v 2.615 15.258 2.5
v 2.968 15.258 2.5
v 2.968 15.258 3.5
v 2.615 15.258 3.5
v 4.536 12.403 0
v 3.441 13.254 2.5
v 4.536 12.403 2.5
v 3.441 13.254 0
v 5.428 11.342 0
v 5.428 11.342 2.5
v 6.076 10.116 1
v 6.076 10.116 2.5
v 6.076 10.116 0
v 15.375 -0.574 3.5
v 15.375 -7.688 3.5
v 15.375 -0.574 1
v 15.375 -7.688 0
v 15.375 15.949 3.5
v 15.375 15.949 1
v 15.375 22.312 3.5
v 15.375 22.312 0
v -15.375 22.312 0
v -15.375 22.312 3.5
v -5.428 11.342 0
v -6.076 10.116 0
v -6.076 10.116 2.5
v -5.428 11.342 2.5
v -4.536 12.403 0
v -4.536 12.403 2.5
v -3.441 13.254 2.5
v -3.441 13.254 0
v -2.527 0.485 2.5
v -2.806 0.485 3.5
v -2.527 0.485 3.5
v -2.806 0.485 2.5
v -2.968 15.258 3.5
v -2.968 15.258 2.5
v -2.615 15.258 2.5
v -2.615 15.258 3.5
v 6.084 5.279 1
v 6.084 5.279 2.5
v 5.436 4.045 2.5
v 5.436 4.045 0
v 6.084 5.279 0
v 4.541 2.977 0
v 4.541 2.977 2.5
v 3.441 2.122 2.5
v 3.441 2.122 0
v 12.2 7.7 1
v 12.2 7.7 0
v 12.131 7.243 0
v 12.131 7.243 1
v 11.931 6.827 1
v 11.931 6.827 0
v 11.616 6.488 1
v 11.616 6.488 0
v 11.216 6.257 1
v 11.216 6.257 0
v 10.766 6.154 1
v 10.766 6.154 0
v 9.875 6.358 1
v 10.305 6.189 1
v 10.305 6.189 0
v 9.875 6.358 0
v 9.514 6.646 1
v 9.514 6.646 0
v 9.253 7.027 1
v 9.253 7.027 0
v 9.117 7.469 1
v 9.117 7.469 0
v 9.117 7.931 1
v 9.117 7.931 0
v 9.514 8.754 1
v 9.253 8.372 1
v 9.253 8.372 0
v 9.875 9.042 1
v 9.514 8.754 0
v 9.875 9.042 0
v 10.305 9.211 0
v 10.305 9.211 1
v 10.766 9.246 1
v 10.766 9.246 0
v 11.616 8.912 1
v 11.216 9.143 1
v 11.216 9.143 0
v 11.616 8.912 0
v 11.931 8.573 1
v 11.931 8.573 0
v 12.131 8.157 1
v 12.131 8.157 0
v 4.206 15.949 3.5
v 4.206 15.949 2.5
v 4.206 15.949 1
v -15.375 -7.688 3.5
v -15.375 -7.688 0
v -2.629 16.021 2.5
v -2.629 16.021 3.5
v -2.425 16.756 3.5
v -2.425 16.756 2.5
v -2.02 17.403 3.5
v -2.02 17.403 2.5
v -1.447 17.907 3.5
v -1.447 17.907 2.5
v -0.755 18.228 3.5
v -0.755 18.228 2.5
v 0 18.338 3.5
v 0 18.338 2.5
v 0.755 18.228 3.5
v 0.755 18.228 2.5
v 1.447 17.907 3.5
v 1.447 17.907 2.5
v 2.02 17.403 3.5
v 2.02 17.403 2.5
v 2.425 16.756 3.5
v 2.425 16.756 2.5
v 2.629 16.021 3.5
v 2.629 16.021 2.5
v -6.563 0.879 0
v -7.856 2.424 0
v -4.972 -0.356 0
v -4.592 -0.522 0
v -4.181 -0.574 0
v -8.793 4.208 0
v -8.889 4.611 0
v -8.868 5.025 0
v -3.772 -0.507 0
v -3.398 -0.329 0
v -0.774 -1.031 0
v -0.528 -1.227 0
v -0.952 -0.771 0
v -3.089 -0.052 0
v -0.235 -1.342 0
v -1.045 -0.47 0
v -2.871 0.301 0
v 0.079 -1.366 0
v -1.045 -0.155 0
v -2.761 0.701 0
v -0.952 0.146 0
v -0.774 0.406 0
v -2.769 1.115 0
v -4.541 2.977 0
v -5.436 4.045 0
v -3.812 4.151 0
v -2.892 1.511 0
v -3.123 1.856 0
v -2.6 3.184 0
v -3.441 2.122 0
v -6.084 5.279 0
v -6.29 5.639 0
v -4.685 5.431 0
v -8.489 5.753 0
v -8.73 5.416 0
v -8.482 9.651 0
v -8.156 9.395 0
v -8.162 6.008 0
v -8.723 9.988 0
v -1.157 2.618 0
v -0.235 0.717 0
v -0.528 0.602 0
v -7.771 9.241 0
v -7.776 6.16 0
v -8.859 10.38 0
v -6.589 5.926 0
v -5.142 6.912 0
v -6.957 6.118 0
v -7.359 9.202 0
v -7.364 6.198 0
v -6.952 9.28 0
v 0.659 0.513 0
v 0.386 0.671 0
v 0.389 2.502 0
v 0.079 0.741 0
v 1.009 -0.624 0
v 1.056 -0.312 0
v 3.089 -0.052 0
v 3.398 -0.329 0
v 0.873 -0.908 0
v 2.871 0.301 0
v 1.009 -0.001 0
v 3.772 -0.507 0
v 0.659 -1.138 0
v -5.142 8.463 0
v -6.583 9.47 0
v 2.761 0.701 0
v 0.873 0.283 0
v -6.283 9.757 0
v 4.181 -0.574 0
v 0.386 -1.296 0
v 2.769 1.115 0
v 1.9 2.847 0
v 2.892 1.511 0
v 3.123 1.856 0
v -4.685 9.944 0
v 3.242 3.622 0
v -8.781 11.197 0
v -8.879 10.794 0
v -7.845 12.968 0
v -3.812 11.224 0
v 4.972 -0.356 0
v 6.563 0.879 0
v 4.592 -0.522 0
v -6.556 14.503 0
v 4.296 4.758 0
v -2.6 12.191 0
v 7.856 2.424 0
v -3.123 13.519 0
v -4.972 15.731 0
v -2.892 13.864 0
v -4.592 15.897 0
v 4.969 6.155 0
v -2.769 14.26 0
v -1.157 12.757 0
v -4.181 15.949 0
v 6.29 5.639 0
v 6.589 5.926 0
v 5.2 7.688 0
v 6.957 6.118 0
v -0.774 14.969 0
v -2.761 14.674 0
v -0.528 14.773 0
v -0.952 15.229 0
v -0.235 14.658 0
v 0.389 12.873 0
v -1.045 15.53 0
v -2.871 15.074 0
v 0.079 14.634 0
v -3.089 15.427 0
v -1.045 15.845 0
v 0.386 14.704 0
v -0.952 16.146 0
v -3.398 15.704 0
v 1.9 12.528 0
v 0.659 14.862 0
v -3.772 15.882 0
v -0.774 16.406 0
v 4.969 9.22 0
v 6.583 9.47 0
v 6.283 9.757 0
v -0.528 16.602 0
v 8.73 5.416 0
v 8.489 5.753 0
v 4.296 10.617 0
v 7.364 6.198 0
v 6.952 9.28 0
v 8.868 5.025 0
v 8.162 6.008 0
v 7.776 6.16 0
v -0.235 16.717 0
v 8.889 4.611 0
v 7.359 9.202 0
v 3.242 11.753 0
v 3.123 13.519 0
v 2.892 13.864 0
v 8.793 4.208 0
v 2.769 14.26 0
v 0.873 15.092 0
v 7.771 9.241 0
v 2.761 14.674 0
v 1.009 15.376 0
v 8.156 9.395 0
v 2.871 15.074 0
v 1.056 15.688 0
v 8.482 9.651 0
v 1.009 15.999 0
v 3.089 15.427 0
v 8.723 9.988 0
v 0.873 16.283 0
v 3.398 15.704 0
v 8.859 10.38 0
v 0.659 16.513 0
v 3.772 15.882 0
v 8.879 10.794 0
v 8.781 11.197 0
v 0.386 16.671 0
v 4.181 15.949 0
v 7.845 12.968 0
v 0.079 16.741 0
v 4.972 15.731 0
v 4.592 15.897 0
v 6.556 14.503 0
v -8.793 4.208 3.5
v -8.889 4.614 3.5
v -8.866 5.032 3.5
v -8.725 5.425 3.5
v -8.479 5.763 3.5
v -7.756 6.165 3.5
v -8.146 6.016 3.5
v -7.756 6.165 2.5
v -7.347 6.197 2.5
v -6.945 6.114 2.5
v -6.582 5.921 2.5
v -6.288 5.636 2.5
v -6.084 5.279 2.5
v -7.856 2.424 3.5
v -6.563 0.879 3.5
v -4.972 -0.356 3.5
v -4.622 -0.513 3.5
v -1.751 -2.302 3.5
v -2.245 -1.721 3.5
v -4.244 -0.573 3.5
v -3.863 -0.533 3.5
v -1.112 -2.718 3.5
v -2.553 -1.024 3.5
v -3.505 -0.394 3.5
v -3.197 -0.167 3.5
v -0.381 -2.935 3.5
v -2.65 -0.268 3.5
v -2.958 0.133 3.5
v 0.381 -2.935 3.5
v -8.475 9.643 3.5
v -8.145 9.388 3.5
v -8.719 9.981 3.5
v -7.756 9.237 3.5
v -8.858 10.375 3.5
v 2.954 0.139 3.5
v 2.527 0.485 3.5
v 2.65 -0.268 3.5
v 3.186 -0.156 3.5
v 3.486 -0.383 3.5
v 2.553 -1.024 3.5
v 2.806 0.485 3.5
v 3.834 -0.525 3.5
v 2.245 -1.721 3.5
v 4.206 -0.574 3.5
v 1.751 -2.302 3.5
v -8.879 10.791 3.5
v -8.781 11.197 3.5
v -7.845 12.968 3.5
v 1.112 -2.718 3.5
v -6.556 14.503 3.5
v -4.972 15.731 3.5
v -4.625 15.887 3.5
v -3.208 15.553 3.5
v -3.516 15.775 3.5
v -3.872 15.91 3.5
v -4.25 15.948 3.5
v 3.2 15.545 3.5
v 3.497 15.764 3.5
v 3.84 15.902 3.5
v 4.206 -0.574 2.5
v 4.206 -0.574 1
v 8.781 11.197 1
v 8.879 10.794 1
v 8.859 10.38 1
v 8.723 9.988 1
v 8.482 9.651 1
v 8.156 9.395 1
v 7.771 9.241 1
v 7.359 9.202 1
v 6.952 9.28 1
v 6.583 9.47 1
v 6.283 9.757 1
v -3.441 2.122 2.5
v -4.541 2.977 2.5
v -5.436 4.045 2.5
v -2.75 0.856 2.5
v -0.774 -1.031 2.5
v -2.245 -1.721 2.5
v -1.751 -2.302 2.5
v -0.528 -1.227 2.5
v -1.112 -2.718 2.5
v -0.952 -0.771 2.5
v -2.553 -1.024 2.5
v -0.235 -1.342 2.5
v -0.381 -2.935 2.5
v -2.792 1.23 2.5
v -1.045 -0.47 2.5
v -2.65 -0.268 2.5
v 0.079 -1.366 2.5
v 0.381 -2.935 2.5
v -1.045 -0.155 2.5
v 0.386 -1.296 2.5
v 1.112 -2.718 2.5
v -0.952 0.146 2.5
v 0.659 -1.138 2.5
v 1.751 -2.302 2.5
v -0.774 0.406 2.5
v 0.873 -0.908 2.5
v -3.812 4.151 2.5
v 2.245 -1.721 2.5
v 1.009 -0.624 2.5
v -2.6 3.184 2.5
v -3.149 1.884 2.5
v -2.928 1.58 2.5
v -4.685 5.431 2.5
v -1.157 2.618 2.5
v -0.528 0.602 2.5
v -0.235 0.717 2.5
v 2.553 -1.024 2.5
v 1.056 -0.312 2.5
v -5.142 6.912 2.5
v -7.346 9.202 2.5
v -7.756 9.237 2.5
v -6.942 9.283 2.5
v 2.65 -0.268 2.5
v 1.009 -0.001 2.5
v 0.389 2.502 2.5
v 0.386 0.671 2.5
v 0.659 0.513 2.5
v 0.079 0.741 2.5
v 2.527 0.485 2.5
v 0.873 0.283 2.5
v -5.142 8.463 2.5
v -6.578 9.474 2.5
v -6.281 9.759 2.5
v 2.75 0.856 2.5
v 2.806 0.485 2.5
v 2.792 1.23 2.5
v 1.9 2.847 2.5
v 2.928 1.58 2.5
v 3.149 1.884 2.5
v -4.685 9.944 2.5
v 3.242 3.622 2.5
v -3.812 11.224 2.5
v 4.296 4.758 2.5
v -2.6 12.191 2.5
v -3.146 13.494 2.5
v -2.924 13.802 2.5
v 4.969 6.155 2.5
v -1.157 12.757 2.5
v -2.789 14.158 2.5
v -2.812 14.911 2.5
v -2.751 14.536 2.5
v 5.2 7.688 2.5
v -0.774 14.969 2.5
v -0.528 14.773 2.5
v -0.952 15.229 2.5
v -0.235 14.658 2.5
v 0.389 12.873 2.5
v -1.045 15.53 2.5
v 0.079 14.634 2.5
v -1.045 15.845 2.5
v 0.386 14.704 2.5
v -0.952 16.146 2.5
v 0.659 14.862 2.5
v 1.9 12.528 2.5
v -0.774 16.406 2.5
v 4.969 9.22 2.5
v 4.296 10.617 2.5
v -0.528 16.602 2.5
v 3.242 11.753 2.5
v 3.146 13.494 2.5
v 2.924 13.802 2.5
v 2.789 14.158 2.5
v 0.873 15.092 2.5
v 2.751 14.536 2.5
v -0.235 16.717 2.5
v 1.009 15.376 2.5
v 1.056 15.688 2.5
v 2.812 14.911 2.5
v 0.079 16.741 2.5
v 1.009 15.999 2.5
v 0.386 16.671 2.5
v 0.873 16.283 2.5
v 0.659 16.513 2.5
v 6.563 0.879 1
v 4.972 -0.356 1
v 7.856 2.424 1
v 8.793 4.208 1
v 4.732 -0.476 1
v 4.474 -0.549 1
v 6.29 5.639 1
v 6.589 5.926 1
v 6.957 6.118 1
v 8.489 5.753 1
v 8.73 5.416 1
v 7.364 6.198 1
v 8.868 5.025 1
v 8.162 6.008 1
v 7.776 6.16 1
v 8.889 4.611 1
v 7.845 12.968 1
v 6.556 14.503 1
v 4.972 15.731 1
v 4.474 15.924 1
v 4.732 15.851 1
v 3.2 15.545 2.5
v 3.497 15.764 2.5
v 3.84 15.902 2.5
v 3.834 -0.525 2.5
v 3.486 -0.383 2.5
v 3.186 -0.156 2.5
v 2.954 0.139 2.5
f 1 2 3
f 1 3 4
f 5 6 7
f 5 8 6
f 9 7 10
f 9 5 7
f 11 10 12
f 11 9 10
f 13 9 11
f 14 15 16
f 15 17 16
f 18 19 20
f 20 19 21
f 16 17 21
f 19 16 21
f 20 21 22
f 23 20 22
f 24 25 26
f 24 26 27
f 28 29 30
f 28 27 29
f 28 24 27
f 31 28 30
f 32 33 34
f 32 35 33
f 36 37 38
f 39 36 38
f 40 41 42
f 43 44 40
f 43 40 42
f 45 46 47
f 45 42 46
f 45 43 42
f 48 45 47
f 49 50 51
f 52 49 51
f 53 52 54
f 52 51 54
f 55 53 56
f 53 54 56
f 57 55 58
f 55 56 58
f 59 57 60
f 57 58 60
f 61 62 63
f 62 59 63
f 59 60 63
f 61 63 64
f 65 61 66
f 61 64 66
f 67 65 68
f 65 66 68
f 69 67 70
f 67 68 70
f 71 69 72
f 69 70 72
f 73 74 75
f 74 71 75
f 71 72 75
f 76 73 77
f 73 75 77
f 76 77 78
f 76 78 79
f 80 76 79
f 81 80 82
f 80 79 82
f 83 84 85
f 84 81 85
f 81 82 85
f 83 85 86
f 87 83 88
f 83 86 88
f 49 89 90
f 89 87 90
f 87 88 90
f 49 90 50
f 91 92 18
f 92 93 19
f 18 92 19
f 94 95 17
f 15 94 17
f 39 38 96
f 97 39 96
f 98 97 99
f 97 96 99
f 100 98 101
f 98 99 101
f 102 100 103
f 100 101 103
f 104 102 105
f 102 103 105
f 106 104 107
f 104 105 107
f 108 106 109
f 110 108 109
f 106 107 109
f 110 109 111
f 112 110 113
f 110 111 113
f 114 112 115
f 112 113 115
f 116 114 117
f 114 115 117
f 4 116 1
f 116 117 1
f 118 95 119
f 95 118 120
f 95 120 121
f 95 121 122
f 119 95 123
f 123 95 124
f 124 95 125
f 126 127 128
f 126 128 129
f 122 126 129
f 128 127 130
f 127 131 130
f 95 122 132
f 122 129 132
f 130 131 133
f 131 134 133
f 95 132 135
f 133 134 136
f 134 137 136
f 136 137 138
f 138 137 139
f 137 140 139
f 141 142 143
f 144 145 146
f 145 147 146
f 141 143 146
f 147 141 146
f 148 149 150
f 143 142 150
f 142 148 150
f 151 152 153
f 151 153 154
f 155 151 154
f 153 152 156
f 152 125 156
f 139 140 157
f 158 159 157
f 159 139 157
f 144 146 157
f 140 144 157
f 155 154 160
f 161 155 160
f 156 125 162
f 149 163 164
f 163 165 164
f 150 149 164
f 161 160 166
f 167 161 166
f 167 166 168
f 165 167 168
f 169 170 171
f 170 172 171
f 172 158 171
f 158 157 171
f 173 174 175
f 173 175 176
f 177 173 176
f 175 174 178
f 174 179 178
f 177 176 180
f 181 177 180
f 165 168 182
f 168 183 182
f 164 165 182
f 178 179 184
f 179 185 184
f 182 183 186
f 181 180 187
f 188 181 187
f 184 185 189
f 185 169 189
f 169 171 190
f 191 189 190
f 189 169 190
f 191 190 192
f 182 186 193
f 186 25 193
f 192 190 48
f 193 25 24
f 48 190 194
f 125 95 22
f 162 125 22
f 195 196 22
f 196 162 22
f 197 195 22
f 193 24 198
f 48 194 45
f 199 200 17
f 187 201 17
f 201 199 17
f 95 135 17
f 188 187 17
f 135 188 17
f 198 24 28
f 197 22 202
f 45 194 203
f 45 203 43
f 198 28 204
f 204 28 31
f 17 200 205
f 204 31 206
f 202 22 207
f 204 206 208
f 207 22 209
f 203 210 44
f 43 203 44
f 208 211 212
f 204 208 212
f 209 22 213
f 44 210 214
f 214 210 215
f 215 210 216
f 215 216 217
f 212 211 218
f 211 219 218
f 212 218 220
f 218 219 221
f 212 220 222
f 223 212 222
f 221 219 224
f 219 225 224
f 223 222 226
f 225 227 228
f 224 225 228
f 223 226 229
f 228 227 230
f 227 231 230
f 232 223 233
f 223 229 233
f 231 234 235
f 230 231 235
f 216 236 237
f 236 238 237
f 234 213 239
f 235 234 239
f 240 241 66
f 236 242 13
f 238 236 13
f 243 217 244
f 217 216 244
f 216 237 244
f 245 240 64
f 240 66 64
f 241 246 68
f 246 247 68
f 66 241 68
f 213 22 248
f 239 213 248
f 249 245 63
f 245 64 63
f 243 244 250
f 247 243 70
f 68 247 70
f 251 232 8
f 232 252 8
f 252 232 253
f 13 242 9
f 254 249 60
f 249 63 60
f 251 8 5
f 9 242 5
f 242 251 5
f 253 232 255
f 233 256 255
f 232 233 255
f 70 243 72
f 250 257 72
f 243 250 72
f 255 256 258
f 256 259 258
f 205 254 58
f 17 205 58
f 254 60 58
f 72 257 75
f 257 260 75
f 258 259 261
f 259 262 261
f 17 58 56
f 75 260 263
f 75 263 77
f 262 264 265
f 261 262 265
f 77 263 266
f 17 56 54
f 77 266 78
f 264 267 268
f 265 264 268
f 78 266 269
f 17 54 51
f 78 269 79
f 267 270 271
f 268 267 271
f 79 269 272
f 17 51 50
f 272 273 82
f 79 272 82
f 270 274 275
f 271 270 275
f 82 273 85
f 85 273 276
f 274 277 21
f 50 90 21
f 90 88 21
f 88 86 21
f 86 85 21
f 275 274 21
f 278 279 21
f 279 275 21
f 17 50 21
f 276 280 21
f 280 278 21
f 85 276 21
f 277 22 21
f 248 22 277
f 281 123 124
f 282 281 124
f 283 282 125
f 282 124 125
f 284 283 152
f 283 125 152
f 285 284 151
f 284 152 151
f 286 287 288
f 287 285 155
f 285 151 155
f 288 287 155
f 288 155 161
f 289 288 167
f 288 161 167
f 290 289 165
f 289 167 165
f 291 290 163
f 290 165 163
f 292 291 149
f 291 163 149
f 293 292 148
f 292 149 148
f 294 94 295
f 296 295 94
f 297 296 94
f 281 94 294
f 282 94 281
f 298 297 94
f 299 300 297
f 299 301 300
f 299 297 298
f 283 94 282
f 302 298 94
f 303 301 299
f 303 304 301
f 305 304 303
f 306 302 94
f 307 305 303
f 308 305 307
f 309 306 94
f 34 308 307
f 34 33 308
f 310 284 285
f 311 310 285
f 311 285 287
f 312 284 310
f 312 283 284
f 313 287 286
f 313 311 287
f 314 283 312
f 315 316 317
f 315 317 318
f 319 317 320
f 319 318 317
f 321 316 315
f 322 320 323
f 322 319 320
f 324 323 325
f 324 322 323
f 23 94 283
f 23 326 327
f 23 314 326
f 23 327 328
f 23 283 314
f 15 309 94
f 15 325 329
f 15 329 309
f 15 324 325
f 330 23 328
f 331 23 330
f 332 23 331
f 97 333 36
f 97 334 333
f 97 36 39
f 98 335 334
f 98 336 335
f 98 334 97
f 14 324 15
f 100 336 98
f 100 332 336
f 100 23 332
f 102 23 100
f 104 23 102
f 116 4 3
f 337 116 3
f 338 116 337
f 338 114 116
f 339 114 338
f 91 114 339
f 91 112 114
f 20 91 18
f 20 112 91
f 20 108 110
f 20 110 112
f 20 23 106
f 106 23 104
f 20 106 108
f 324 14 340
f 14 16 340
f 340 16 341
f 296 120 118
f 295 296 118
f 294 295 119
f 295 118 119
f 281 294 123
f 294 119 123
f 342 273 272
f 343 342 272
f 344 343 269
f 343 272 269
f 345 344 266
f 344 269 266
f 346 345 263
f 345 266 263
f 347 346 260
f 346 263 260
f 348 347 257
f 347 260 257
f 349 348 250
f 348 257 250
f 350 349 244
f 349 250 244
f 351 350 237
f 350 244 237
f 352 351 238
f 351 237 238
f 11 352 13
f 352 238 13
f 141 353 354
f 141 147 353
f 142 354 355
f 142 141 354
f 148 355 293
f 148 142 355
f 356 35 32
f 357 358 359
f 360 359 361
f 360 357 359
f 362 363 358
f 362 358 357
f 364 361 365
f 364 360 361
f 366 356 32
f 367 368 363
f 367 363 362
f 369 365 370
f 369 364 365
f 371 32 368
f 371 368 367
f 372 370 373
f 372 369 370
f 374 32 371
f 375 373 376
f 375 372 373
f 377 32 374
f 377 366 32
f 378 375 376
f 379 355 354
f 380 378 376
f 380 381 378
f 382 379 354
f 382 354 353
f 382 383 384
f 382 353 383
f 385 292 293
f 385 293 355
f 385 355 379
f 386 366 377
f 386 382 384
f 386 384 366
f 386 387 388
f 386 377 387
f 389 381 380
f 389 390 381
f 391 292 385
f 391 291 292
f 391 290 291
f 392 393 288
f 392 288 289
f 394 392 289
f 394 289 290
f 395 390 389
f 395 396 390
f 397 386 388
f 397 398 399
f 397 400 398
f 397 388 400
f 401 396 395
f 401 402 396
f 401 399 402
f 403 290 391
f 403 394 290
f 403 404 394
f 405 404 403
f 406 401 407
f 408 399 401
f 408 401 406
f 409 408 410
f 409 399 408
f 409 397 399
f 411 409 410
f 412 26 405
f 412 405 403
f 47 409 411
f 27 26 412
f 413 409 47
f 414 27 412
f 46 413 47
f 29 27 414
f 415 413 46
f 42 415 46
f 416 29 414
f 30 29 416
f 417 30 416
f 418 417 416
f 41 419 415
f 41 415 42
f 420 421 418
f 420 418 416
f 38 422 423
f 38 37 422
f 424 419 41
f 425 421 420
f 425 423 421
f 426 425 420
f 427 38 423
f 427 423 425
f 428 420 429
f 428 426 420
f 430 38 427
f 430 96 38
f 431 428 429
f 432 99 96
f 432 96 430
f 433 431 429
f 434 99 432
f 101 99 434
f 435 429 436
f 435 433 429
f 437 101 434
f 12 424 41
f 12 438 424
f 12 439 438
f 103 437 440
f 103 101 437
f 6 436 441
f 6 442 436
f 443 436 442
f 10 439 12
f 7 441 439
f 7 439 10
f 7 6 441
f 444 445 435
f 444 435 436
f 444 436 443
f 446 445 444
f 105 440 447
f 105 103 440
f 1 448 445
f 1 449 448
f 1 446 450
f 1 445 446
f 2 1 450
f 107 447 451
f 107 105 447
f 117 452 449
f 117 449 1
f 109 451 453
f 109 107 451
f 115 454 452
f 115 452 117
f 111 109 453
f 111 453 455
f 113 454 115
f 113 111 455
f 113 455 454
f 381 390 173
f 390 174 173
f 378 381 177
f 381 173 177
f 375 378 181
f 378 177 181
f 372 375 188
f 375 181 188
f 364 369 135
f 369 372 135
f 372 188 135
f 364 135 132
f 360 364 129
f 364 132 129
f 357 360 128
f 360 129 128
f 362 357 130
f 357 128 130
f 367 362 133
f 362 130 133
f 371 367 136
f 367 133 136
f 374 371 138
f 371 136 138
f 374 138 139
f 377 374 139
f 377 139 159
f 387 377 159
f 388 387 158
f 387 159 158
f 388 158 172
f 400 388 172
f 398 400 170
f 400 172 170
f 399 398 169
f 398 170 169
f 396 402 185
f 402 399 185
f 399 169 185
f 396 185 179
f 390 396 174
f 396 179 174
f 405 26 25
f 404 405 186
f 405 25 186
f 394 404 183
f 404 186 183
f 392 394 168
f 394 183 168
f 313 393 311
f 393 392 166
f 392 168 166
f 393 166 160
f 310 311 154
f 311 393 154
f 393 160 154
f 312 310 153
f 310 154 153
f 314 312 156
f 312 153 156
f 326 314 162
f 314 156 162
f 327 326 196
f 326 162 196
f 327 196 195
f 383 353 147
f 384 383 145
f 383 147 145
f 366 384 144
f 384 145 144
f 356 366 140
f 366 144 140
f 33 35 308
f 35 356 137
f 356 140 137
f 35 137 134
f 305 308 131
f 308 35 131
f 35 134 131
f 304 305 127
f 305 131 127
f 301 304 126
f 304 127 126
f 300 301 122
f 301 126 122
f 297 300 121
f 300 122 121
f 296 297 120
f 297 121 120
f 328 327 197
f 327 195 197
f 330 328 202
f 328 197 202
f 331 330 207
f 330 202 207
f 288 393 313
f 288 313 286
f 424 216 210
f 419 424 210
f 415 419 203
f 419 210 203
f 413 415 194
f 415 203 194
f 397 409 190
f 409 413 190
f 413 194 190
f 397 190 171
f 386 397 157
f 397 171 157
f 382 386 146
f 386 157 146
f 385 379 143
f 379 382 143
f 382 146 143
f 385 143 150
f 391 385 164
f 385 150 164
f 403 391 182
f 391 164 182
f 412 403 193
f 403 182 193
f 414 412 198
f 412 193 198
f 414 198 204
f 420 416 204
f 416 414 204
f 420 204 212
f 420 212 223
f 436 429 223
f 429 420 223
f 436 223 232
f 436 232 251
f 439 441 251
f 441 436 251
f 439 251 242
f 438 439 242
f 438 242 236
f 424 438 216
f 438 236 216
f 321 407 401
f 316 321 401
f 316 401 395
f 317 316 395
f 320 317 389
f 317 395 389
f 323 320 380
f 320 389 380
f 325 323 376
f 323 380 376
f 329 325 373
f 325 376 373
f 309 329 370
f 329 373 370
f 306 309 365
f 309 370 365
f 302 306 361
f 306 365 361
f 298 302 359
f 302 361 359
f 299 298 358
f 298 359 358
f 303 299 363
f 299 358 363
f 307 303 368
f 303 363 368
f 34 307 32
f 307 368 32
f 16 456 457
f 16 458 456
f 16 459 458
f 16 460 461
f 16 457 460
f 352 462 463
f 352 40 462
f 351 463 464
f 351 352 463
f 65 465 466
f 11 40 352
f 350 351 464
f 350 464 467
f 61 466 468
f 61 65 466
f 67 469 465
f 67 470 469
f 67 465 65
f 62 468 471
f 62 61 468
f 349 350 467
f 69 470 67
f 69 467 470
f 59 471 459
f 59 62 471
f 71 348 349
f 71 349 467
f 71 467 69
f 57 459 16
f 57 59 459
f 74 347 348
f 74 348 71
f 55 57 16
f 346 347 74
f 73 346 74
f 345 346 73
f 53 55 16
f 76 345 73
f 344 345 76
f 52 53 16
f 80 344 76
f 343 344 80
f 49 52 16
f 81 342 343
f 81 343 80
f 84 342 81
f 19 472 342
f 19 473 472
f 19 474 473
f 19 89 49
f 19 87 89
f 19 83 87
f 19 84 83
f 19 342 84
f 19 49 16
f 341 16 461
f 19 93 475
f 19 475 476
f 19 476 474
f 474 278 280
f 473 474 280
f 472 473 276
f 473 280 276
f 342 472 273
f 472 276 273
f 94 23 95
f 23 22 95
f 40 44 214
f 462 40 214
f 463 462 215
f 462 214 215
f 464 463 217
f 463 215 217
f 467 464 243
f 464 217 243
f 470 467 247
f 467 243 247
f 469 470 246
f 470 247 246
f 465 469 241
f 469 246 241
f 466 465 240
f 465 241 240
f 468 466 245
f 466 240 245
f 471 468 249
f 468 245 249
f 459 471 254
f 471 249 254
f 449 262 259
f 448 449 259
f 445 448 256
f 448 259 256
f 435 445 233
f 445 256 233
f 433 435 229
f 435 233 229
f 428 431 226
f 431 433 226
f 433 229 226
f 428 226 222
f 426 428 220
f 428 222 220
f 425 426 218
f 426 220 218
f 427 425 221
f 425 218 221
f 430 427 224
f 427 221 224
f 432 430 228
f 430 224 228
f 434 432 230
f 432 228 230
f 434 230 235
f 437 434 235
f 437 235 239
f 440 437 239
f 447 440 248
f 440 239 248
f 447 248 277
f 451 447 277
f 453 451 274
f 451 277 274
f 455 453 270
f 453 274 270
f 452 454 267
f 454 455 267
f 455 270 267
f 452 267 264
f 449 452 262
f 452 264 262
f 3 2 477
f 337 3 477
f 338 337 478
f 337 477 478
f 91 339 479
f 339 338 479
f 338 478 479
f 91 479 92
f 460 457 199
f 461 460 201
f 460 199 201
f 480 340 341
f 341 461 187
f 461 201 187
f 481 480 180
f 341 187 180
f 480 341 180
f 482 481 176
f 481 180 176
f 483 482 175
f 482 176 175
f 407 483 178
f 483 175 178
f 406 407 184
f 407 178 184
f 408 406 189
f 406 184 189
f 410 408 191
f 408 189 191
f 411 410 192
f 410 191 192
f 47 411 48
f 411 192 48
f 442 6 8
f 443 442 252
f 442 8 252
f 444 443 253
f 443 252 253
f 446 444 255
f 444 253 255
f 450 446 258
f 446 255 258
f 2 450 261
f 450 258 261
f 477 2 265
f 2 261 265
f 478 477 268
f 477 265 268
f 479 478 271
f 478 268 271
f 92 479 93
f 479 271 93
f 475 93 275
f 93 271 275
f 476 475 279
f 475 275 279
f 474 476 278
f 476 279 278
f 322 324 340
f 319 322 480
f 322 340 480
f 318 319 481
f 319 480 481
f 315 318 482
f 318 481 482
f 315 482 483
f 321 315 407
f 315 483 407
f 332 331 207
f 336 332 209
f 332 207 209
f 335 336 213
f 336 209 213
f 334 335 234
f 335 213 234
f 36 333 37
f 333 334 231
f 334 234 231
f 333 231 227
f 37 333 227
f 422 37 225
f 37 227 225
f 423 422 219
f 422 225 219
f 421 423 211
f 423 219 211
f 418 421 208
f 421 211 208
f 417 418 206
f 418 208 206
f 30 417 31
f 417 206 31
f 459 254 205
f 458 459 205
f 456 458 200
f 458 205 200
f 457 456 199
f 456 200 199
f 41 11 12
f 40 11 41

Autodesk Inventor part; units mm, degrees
ref_plane "YZ Plane" through (0, 0, 0) normal (1, 0, 0) x (0, 1, 0)
ref_plane "XZ Plane" through (0, 0, 0) normal (0, 1, 0) x (-1, 0, 0)
ref_plane "XY Plane" through (0, 0, 0) normal (0, 0, 1) x (1, 0, 0)
ref_plane "Work Plane1" through (0, 0, 0) normal (0, 0, 1) x (1, 0, 0)
sketch "Sketch1" plane through (0, 0, 0) normal (0, 0, 1) x (1, 0, 0)
  arc A0 (-3.651, 13.5937) -> (-4.7619, 15.391) centre (-4.2064, 14.4923) ccw projected
  arc A1 (-3.651, 13.5937) -> (-6.4477, 10.2643) centre (0, 7.6875) ccw projected
  arc A2 (-8.4097, 11.0483) -> (-6.4477, 10.2643) centre (-7.4287, 10.6563) ccw projected
  arc A3 (-4.7619, 15.391) -> (-8.4097, 11.0483) centre (0, 7.6875) ccw projected
  arc A4 (6.4477, 10.2643) -> (8.4097, 11.0483) centre (7.4287, 10.6563) ccw projected
  arc A5 (6.4477, 10.2643) -> (3.651, 13.5937) centre (0, 7.6875) ccw projected
  arc A6 (4.7619, 15.391) -> (3.651, 13.5937) centre (4.2064, 14.4923) ccw projected
  arc A7 (8.4097, 11.0483) -> (4.7619, 15.391) centre (0, 7.6875) ccw projected
  arc A8 (-6.4563, 5.1322) -> (-8.4209, 4.3547) centre (-7.4386, 4.7434) ccw projected
  arc A9 (-6.4563, 5.1322) -> (-3.651, 1.7813) centre (0, 7.6875) ccw projected
  arc A10 (-4.7619, -0.016) -> (-3.651, 1.7813) centre (-4.2064, 0.8827) ccw projected
  arc A11 (-8.4209, 4.3547) -> (-4.7619, -0.016) centre (0, 7.6875) ccw projected
  arc A12 (3.651, 1.7813) -> (4.7619, -0.016) centre (4.2064, 0.8827) ccw projected
  arc A13 (3.651, 1.7813) -> (6.4563, 5.1322) centre (0, 7.6875) ccw projected
  arc A14 (8.4209, 4.3547) -> (6.4563, 5.1322) centre (7.4386, 4.7434) ccw projected
  arc A15 (4.7619, -0.016) -> (8.4209, 4.3547) centre (0, 7.6875) ccw projected
  circle A16 centre (10.65, 7.6999) radius 1.15 projected
  circle A17 centre (0, 15.6875) radius 1.0564 projected
  circle A18 centre (0, -0.3125) radius 1.0564 projected
  circle A19 centre (0, 7.6875) radius 5 projected
  circle A20 centre (0, 7.6875) radius 13.7 projected
  line L0 (-116.625, -11.1875) -> (15.375, -11.1875) projected
  line L1 (15.375, -11.1875) -> (15.375, -7.6875) projected
  line L2 (-116.625, -7.6875) -> (15.375, -7.6875) projected
  line L3 (-116.625, -11.1875) -> (-116.625, -7.6875) projected
  line L4 (15.375, -7.6875) -> (-15.375, -7.6875)
  line L5 (-15.375, -7.6875) -> (-15.375, 22.3125)
  line L6 (-15.375, 22.3125) -> (15.375, 22.3125)
  line L7 (15.375, 22.3125) -> (15.375, -7.6875)
  circle A21 centre (0, 7.6875) radius 14.375 projected
  circle A22 centre (0, 7.6875) radius 5.2
  arc A23 (-3.4406, 13.2535) -> (-4.9722, 15.7312) centre (-4.2064, 14.4923) ccw
  arc A24 (-3.4406, 13.2535) -> (-6.0763, 10.1158) centre (0, 7.6875) ccw
  arc A25 (-8.7812, 11.1968) -> (-6.0763, 10.1158) centre (-7.4287, 10.6563) ccw
  arc A26 (-4.9722, 15.7312) -> (-8.7812, 11.1968) centre (0, 7.6875) ccw
  arc A27 (4.9722, 15.7312) -> (3.4406, 13.2535) centre (4.2064, 14.4923) ccw
  arc A28 (6.0763, 10.1158) -> (3.4406, 13.2535) centre (0, 7.6875) ccw
  arc A29 (6.0763, 10.1158) -> (8.7812, 11.1968) centre (7.4287, 10.6563) ccw
  arc A30 (8.7812, 11.1968) -> (4.9722, 15.7312) centre (0, 7.6875) ccw
  arc A31 (3.4406, 2.1215) -> (6.0844, 5.2794) centre (0, 7.6875) ccw
  arc A32 (3.4406, 2.1215) -> (4.9722, -0.3562) centre (4.2064, 0.8827) ccw
  arc A33 (4.9722, -0.3562) -> (8.7928, 4.2075) centre (0, 7.6875) ccw
  arc A34 (8.7928, 4.2075) -> (6.0844, 5.2794) centre (7.4386, 4.7434) ccw
  arc A35 (-6.0844, 5.2794) -> (-8.7928, 4.2075) centre (-7.4386, 4.7434) ccw
  arc A36 (-6.0844, 5.2794) -> (-3.4406, 2.1215) centre (0, 7.6875) ccw
  arc A37 (-4.9722, -0.3562) -> (-3.4406, 2.1215) centre (-4.2064, 0.8827) ccw
  arc A38 (-8.7928, 4.2075) -> (-4.9722, -0.3562) centre (0, 7.6875) ccw
  circle A39 centre (10.65, 7.6999) radius 1.55
  point P0 (0, 0)
  dimension "d0" = 30
  dimension "d1" = 15.375
  dimension "d2" = 15.375
  dimension "d3" = 0.2
  dimension "d4" = 0.4
  dimension "d5" = 0.4
  dimension "d6" = 0.4
  dimension "d7" = 0.4
  dimension "d8" = 0.4
extrude "Extrusion1" add sketch "Sketch1" along normal blind 1 contours A20 | L2 L5 L6 L7 | A21
sketch "Sketch2" plane through (0, 0, 1) normal (0, 0, 1) x (1, 0, 0)
  line L0 (15.375, 22.3125) -> (-15.375, 22.3125) projected
  line L1 (-15.375, 22.3125) -> (-15.375, -7.6875) projected
  line L2 (-15.375, -7.6875) -> (15.375, -7.6875) projected
  line L3 (15.375, -7.6875) -> (15.375, 22.3125) projected
  circle A0 centre (0, 15.6875) radius 1.0564 projected
  circle A1 centre (0, -0.3125) radius 1.0564 projected
  circle A2 centre (0, 7.6875) radius 5.2 projected
  arc A3 (-3.4406, 13.2535) -> (-6.0763, 10.1158) centre (0, 7.6875) ccw projected
  arc A4 (-8.7812, 11.1968) -> (-6.0763, 10.1158) centre (-7.4287, 10.6563) ccw projected
  arc A5 (-4.9722, 15.7312) -> (-8.7812, 11.1968) centre (0, 7.6875) ccw projected
  arc A6 (-3.4406, 13.2535) -> (-4.9722, 15.7312) centre (-4.2064, 14.4923) ccw projected
  arc A7 (6.0763, 10.1158) -> (3.4406, 13.2535) centre (0, 7.6875) ccw projected
  arc A8 (4.9722, 15.7312) -> (3.4406, 13.2535) centre (4.2064, 14.4923) ccw projected
  arc A9 (8.7812, 11.1968) -> (4.9722, 15.7312) centre (0, 7.6875) ccw projected
  arc A10 (6.0763, 10.1158) -> (8.7812, 11.1968) centre (7.4287, 10.6563) ccw projected
  arc A11 (3.4406, 2.1215) -> (4.9722, -0.3562) centre (4.2064, 0.8827) ccw projected
  arc A12 (3.4406, 2.1215) -> (6.0844, 5.2794) centre (0, 7.6875) ccw projected
  arc A13 (8.7928, 4.2075) -> (6.0844, 5.2794) centre (7.4386, 4.7434) ccw projected
  arc A14 (4.9722, -0.3562) -> (8.7928, 4.2075) centre (0, 7.6875) ccw projected
  arc A15 (-6.0844, 5.2794) -> (-3.4406, 2.1215) centre (0, 7.6875) ccw projected
  arc A16 (-4.9722, -0.3562) -> (-3.4406, 2.1215) centre (-4.2064, 0.8827) ccw projected
  arc A17 (-8.7928, 4.2075) -> (-4.9722, -0.3562) centre (0, 7.6875) ccw projected
  arc A18 (-6.0844, 5.2794) -> (-8.7928, 4.2075) centre (-7.4386, 4.7434) ccw projected
  circle A19 centre (10.65, 7.6999) radius 1.55 projected
  arc A20 (4.9722, 15.7312) -> (3.4406, 13.2535) centre (4.2064, 14.4923) ccw projected
  line L4 (4.2064, 15.9488) -> (15.375, 15.9488)
  line L5 (15.375, -7.6875) -> (15.375, 22.3125) projected
  line L6 (4.2064, -0.5738) -> (15.375, -0.5738)
  arc A21 (6.0763, 10.1158) -> (8.7812, 11.1968) centre (7.4287, 10.6563) ccw projected
  line L7 (6.0763, 10.1158) -> (6.0844, 5.2794)
  point P0 (0, 0)
extrude "Extrusion2" add sketch "Sketch2" along normal blind 1.5 contours L3 L4 A8 A7 L7 A12 A11 L6 L2 L1 L0
sketch "Sketch3" plane through (0, 0, 2.5) normal (0, 0, 1) x (1, 0, 0)
  line L0 (15.375, -7.6875) -> (15.375, -0.5738) projected
  line L1 (15.375, -0.5738) -> (4.2064, -0.5738) projected
  arc A0 (3.4406, 2.1215) -> (4.2064, -0.5738) centre (4.2064, 0.8827) ccw projected
  arc A1 (3.4406, 2.1215) -> (6.0844, 5.2794) centre (0, 7.6875) ccw projected
  line L2 (6.0844, 5.2794) -> (6.0763, 10.1158) projected
  arc A2 (6.0763, 10.1158) -> (3.4406, 13.2535) centre (0, 7.6875) ccw projected
  arc A3 (4.2064, 15.9488) -> (3.4406, 13.2535) centre (4.2064, 14.4923) ccw projected
  line L3 (4.2064, 15.9488) -> (15.375, 15.9488) projected
  line L4 (15.375, 15.9488) -> (15.375, 22.3125) projected
  line L5 (15.375, 22.3125) -> (-15.375, 22.3125) projected
  line L6 (-15.375, 22.3125) -> (-15.375, -7.6875) projected
  line L7 (-15.375, -7.6875) -> (15.375, -7.6875) projected
  circle A4 centre (0, 15.6875) radius 1.0564 projected
  circle A5 centre (0, -0.3125) radius 1.0564 projected
  arc A6 (-6.0844, 5.2794) -> (-8.7928, 4.2075) centre (-7.4386, 4.7434) ccw projected
  arc A7 (-6.0844, 5.2794) -> (-3.4406, 2.1215) centre (0, 7.6875) ccw projected
  arc A8 (-4.9722, -0.3562) -> (-3.4406, 2.1215) centre (-4.2064, 0.8827) ccw projected
  arc A9 (-8.7928, 4.2075) -> (-4.9722, -0.3562) centre (0, 7.6875) ccw projected
  arc A10 (-3.4406, 13.2535) -> (-4.9722, 15.7312) centre (-4.2064, 14.4923) ccw projected
  arc A11 (-3.4406, 13.2535) -> (-6.0763, 10.1158) centre (0, 7.6875) ccw projected
  arc A12 (-8.7812, 11.1968) -> (-6.0763, 10.1158) centre (-7.4287, 10.6563) ccw projected
  arc A13 (-4.9722, 15.7312) -> (-8.7812, 11.1968) centre (0, 7.6875) ccw projected
  circle A14 centre (0, 7.6875) radius 5.2 projected
  circle A15 centre (0, 15.6875) radius 2.65
  circle A16 centre (0, -0.3125) radius 1.0564 projected
  circle A17 centre (0, -0.3125) radius 2.65
  arc A18 (-2.4425, 10.6818) -> (-4.3563, 11.5819) centre (-5.3868, 6.906) ccw projected
  arc A19 (-4.3563, 11.5819) -> (-4.9119, 10.8525) centre (0, 7.6875) ccw projected
  arc A20 (-4.9119, 10.8525) -> (-3.5356, 9.2466) centre (-0.678, 13.0883) ccw projected
  arc A21 (-3.5356, 9.2466) -> (-3.736, 8.6743) centre (0, 7.6875) ccw projected
  arc A22 (-3.736, 8.6743) -> (-5.8134, 8.2775) centre (-3.8987, 3.889) ccw projected
  arc A23 (-5.8134, 8.2775) -> (-5.8341, 7.3609) centre (0, 7.6875) ccw projected
  arc A24 (-5.8341, 7.3609) -> (-3.7768, 6.8706) centre (-3.723, 11.6584) ccw projected
  arc A25 (-3.7768, 6.8706) -> (-3.6025, 6.2899) centre (0, 7.6875) ccw projected
  arc A26 (-3.6025, 6.2899) -> (-5.05, 4.7478) centre (-0.9214, 2.3228) ccw projected
  arc A27 (-5.05, 4.7478) -> (-4.5279, 3.994) centre (0, 7.6875) ccw projected
  arc A28 (-4.5279, 3.994) -> (-2.5753, 4.8067) centre (-5.346, 8.7117) ccw projected
  arc A29 (-2.5753, 4.8067) -> (-2.093, 4.4393) centre (0, 7.6875) ccw projected
  arc A30 (-2.093, 4.4393) -> (-2.3576, 2.341) centre (2.4078, 2.8058) ccw projected
  arc A31 (-2.3576, 2.341) -> (-1.4922, 2.038) centre (0, 7.6875) ccw projected
  arc A32 (-1.4922, 2.038) -> (-0.3902, 3.8431) centre (-4.927, 5.3738) ccw projected
  arc A33 (-0.3902, 3.8431) -> (0.216, 3.8294) centre (0, 7.6875) ccw projected
  arc A34 (0.216, 3.8294) -> (1.2353, 1.9763) centre (4.8174, 5.1534) ccw projected
  arc A35 (1.2353, 1.9763) -> (2.1135, 2.2398) centre (0, 7.6875) ccw projected
  arc A36 (2.1135, 2.2398) -> (1.944, 4.348) centre (-2.6261, 2.9196) ccw projected
  arc A37 (1.944, 4.348) -> (2.4425, 4.6932) centre (0, 7.6875) ccw projected
  arc A38 (2.4425, 4.6932) -> (4.3563, 3.7931) centre (5.3868, 8.469) ccw projected
  arc A39 (4.3563, 3.7931) -> (4.9119, 4.5225) centre (0, 7.6875) ccw projected
  arc A40 (4.9119, 4.5225) -> (3.5356, 6.1284) centre (0.678, 2.2867) ccw projected
  arc A41 (3.5356, 6.1284) -> (3.736, 6.7007) centre (0, 7.6875) ccw projected
  arc A42 (3.736, 6.7007) -> (5.8134, 7.0975) centre (3.8987, 11.486) ccw projected
  arc A43 (5.8134, 7.0975) -> (5.8341, 8.0141) centre (0, 7.6875) ccw projected
  arc A44 (5.8341, 8.0141) -> (3.7768, 8.5044) centre (3.723, 3.7166) ccw projected
  arc A45 (3.7768, 8.5044) -> (3.6025, 9.0851) centre (0, 7.6875) ccw projected
  arc A46 (3.6025, 9.0851) -> (5.05, 10.6272) centre (0.9214, 13.0522) ccw projected
  arc A47 (5.05, 10.6272) -> (4.5279, 11.381) centre (0, 7.6875) ccw projected
  arc A48 (4.5279, 11.381) -> (2.5753, 10.5683) centre (5.346, 6.6633) ccw projected
  arc A49 (2.5753, 10.5683) -> (2.093, 10.9357) centre (0, 7.6875) ccw projected
  arc A50 (2.093, 10.9357) -> (2.3576, 13.034) centre (-2.4078, 12.5692) ccw projected
  arc A51 (2.3576, 13.034) -> (1.4922, 13.337) centre (0, 7.6875) ccw projected
  arc A52 (1.4922, 13.337) -> (0.3902, 11.5319) centre (4.927, 10.0012) ccw projected
  arc A53 (0.3902, 11.5319) -> (-0.216, 11.5456) centre (0, 7.6875) ccw projected
  arc A54 (-0.216, 11.5456) -> (-1.2353, 13.3987) centre (-4.8174, 10.2216) ccw projected
  arc A55 (-1.2353, 13.3987) -> (-2.1135, 13.1352) centre (0, 7.6875) ccw projected
  arc A56 (-2.1135, 13.1352) -> (-1.944, 11.027) centre (2.6261, 12.4554) ccw projected
  arc A57 (-1.944, 11.027) -> (-2.4425, 10.6818) centre (0, 7.6875) ccw projected
  circle A58 centre (0, 7.6875) radius 5.8433
  circle A59 centre (0, 7.6875) radius 6.5436
  arc A60 (-3.4406, 13.2535) -> (-4.9722, 15.7312) centre (-4.2064, 14.4923) ccw projected
  line L8 (-2.9676, 15.2581) -> (-2.615, 15.2581)
  arc A61 (4.9722, 15.7312) -> (3.4406, 13.2535) centre (4.2064, 14.4923) ccw projected
  line L9 (2.9676, 15.2581) -> (2.615, 15.2581)
  arc A62 (3.4406, 2.1215) -> (4.9722, -0.3562) centre (4.2064, 0.8827) ccw projected
  line L10 (2.8055, 0.4846) -> (2.5273, 0.4846)
  arc A63 (-4.9722, -0.3562) -> (-3.4406, 2.1215) centre (-4.2064, 0.8827) ccw projected
  line L11 (-2.8055, 0.4846) -> (-2.5273, 0.4846)
  arc A64 (-8.7812, 11.1968) -> (-6.0763, 10.1158) centre (-7.4287, 10.6563) ccw projected
  line L12 (-7.7556, 9.237) -> (-7.7556, 6.165)
  point P0 (0, 0)
  point P1 (-6.0844, 5.2794)
  point P2 (-6.0763, 10.1158)
  point P3 (2.9676, 15.2581)
  dimension "d13" = 5.3
  dimension "d14" = 5.3
extrude "Extrusion3" add sketch "Sketch3" along normal blind 1 contours L7 L6 L5 L4 L3 A3 L9 A15 L8 A10 A13 A12 L12 A6 A9 A8 L11 A17 L10 A0 L1 L0
equation "\"d2\" = d1"
properties part number "front_motur_holder"
